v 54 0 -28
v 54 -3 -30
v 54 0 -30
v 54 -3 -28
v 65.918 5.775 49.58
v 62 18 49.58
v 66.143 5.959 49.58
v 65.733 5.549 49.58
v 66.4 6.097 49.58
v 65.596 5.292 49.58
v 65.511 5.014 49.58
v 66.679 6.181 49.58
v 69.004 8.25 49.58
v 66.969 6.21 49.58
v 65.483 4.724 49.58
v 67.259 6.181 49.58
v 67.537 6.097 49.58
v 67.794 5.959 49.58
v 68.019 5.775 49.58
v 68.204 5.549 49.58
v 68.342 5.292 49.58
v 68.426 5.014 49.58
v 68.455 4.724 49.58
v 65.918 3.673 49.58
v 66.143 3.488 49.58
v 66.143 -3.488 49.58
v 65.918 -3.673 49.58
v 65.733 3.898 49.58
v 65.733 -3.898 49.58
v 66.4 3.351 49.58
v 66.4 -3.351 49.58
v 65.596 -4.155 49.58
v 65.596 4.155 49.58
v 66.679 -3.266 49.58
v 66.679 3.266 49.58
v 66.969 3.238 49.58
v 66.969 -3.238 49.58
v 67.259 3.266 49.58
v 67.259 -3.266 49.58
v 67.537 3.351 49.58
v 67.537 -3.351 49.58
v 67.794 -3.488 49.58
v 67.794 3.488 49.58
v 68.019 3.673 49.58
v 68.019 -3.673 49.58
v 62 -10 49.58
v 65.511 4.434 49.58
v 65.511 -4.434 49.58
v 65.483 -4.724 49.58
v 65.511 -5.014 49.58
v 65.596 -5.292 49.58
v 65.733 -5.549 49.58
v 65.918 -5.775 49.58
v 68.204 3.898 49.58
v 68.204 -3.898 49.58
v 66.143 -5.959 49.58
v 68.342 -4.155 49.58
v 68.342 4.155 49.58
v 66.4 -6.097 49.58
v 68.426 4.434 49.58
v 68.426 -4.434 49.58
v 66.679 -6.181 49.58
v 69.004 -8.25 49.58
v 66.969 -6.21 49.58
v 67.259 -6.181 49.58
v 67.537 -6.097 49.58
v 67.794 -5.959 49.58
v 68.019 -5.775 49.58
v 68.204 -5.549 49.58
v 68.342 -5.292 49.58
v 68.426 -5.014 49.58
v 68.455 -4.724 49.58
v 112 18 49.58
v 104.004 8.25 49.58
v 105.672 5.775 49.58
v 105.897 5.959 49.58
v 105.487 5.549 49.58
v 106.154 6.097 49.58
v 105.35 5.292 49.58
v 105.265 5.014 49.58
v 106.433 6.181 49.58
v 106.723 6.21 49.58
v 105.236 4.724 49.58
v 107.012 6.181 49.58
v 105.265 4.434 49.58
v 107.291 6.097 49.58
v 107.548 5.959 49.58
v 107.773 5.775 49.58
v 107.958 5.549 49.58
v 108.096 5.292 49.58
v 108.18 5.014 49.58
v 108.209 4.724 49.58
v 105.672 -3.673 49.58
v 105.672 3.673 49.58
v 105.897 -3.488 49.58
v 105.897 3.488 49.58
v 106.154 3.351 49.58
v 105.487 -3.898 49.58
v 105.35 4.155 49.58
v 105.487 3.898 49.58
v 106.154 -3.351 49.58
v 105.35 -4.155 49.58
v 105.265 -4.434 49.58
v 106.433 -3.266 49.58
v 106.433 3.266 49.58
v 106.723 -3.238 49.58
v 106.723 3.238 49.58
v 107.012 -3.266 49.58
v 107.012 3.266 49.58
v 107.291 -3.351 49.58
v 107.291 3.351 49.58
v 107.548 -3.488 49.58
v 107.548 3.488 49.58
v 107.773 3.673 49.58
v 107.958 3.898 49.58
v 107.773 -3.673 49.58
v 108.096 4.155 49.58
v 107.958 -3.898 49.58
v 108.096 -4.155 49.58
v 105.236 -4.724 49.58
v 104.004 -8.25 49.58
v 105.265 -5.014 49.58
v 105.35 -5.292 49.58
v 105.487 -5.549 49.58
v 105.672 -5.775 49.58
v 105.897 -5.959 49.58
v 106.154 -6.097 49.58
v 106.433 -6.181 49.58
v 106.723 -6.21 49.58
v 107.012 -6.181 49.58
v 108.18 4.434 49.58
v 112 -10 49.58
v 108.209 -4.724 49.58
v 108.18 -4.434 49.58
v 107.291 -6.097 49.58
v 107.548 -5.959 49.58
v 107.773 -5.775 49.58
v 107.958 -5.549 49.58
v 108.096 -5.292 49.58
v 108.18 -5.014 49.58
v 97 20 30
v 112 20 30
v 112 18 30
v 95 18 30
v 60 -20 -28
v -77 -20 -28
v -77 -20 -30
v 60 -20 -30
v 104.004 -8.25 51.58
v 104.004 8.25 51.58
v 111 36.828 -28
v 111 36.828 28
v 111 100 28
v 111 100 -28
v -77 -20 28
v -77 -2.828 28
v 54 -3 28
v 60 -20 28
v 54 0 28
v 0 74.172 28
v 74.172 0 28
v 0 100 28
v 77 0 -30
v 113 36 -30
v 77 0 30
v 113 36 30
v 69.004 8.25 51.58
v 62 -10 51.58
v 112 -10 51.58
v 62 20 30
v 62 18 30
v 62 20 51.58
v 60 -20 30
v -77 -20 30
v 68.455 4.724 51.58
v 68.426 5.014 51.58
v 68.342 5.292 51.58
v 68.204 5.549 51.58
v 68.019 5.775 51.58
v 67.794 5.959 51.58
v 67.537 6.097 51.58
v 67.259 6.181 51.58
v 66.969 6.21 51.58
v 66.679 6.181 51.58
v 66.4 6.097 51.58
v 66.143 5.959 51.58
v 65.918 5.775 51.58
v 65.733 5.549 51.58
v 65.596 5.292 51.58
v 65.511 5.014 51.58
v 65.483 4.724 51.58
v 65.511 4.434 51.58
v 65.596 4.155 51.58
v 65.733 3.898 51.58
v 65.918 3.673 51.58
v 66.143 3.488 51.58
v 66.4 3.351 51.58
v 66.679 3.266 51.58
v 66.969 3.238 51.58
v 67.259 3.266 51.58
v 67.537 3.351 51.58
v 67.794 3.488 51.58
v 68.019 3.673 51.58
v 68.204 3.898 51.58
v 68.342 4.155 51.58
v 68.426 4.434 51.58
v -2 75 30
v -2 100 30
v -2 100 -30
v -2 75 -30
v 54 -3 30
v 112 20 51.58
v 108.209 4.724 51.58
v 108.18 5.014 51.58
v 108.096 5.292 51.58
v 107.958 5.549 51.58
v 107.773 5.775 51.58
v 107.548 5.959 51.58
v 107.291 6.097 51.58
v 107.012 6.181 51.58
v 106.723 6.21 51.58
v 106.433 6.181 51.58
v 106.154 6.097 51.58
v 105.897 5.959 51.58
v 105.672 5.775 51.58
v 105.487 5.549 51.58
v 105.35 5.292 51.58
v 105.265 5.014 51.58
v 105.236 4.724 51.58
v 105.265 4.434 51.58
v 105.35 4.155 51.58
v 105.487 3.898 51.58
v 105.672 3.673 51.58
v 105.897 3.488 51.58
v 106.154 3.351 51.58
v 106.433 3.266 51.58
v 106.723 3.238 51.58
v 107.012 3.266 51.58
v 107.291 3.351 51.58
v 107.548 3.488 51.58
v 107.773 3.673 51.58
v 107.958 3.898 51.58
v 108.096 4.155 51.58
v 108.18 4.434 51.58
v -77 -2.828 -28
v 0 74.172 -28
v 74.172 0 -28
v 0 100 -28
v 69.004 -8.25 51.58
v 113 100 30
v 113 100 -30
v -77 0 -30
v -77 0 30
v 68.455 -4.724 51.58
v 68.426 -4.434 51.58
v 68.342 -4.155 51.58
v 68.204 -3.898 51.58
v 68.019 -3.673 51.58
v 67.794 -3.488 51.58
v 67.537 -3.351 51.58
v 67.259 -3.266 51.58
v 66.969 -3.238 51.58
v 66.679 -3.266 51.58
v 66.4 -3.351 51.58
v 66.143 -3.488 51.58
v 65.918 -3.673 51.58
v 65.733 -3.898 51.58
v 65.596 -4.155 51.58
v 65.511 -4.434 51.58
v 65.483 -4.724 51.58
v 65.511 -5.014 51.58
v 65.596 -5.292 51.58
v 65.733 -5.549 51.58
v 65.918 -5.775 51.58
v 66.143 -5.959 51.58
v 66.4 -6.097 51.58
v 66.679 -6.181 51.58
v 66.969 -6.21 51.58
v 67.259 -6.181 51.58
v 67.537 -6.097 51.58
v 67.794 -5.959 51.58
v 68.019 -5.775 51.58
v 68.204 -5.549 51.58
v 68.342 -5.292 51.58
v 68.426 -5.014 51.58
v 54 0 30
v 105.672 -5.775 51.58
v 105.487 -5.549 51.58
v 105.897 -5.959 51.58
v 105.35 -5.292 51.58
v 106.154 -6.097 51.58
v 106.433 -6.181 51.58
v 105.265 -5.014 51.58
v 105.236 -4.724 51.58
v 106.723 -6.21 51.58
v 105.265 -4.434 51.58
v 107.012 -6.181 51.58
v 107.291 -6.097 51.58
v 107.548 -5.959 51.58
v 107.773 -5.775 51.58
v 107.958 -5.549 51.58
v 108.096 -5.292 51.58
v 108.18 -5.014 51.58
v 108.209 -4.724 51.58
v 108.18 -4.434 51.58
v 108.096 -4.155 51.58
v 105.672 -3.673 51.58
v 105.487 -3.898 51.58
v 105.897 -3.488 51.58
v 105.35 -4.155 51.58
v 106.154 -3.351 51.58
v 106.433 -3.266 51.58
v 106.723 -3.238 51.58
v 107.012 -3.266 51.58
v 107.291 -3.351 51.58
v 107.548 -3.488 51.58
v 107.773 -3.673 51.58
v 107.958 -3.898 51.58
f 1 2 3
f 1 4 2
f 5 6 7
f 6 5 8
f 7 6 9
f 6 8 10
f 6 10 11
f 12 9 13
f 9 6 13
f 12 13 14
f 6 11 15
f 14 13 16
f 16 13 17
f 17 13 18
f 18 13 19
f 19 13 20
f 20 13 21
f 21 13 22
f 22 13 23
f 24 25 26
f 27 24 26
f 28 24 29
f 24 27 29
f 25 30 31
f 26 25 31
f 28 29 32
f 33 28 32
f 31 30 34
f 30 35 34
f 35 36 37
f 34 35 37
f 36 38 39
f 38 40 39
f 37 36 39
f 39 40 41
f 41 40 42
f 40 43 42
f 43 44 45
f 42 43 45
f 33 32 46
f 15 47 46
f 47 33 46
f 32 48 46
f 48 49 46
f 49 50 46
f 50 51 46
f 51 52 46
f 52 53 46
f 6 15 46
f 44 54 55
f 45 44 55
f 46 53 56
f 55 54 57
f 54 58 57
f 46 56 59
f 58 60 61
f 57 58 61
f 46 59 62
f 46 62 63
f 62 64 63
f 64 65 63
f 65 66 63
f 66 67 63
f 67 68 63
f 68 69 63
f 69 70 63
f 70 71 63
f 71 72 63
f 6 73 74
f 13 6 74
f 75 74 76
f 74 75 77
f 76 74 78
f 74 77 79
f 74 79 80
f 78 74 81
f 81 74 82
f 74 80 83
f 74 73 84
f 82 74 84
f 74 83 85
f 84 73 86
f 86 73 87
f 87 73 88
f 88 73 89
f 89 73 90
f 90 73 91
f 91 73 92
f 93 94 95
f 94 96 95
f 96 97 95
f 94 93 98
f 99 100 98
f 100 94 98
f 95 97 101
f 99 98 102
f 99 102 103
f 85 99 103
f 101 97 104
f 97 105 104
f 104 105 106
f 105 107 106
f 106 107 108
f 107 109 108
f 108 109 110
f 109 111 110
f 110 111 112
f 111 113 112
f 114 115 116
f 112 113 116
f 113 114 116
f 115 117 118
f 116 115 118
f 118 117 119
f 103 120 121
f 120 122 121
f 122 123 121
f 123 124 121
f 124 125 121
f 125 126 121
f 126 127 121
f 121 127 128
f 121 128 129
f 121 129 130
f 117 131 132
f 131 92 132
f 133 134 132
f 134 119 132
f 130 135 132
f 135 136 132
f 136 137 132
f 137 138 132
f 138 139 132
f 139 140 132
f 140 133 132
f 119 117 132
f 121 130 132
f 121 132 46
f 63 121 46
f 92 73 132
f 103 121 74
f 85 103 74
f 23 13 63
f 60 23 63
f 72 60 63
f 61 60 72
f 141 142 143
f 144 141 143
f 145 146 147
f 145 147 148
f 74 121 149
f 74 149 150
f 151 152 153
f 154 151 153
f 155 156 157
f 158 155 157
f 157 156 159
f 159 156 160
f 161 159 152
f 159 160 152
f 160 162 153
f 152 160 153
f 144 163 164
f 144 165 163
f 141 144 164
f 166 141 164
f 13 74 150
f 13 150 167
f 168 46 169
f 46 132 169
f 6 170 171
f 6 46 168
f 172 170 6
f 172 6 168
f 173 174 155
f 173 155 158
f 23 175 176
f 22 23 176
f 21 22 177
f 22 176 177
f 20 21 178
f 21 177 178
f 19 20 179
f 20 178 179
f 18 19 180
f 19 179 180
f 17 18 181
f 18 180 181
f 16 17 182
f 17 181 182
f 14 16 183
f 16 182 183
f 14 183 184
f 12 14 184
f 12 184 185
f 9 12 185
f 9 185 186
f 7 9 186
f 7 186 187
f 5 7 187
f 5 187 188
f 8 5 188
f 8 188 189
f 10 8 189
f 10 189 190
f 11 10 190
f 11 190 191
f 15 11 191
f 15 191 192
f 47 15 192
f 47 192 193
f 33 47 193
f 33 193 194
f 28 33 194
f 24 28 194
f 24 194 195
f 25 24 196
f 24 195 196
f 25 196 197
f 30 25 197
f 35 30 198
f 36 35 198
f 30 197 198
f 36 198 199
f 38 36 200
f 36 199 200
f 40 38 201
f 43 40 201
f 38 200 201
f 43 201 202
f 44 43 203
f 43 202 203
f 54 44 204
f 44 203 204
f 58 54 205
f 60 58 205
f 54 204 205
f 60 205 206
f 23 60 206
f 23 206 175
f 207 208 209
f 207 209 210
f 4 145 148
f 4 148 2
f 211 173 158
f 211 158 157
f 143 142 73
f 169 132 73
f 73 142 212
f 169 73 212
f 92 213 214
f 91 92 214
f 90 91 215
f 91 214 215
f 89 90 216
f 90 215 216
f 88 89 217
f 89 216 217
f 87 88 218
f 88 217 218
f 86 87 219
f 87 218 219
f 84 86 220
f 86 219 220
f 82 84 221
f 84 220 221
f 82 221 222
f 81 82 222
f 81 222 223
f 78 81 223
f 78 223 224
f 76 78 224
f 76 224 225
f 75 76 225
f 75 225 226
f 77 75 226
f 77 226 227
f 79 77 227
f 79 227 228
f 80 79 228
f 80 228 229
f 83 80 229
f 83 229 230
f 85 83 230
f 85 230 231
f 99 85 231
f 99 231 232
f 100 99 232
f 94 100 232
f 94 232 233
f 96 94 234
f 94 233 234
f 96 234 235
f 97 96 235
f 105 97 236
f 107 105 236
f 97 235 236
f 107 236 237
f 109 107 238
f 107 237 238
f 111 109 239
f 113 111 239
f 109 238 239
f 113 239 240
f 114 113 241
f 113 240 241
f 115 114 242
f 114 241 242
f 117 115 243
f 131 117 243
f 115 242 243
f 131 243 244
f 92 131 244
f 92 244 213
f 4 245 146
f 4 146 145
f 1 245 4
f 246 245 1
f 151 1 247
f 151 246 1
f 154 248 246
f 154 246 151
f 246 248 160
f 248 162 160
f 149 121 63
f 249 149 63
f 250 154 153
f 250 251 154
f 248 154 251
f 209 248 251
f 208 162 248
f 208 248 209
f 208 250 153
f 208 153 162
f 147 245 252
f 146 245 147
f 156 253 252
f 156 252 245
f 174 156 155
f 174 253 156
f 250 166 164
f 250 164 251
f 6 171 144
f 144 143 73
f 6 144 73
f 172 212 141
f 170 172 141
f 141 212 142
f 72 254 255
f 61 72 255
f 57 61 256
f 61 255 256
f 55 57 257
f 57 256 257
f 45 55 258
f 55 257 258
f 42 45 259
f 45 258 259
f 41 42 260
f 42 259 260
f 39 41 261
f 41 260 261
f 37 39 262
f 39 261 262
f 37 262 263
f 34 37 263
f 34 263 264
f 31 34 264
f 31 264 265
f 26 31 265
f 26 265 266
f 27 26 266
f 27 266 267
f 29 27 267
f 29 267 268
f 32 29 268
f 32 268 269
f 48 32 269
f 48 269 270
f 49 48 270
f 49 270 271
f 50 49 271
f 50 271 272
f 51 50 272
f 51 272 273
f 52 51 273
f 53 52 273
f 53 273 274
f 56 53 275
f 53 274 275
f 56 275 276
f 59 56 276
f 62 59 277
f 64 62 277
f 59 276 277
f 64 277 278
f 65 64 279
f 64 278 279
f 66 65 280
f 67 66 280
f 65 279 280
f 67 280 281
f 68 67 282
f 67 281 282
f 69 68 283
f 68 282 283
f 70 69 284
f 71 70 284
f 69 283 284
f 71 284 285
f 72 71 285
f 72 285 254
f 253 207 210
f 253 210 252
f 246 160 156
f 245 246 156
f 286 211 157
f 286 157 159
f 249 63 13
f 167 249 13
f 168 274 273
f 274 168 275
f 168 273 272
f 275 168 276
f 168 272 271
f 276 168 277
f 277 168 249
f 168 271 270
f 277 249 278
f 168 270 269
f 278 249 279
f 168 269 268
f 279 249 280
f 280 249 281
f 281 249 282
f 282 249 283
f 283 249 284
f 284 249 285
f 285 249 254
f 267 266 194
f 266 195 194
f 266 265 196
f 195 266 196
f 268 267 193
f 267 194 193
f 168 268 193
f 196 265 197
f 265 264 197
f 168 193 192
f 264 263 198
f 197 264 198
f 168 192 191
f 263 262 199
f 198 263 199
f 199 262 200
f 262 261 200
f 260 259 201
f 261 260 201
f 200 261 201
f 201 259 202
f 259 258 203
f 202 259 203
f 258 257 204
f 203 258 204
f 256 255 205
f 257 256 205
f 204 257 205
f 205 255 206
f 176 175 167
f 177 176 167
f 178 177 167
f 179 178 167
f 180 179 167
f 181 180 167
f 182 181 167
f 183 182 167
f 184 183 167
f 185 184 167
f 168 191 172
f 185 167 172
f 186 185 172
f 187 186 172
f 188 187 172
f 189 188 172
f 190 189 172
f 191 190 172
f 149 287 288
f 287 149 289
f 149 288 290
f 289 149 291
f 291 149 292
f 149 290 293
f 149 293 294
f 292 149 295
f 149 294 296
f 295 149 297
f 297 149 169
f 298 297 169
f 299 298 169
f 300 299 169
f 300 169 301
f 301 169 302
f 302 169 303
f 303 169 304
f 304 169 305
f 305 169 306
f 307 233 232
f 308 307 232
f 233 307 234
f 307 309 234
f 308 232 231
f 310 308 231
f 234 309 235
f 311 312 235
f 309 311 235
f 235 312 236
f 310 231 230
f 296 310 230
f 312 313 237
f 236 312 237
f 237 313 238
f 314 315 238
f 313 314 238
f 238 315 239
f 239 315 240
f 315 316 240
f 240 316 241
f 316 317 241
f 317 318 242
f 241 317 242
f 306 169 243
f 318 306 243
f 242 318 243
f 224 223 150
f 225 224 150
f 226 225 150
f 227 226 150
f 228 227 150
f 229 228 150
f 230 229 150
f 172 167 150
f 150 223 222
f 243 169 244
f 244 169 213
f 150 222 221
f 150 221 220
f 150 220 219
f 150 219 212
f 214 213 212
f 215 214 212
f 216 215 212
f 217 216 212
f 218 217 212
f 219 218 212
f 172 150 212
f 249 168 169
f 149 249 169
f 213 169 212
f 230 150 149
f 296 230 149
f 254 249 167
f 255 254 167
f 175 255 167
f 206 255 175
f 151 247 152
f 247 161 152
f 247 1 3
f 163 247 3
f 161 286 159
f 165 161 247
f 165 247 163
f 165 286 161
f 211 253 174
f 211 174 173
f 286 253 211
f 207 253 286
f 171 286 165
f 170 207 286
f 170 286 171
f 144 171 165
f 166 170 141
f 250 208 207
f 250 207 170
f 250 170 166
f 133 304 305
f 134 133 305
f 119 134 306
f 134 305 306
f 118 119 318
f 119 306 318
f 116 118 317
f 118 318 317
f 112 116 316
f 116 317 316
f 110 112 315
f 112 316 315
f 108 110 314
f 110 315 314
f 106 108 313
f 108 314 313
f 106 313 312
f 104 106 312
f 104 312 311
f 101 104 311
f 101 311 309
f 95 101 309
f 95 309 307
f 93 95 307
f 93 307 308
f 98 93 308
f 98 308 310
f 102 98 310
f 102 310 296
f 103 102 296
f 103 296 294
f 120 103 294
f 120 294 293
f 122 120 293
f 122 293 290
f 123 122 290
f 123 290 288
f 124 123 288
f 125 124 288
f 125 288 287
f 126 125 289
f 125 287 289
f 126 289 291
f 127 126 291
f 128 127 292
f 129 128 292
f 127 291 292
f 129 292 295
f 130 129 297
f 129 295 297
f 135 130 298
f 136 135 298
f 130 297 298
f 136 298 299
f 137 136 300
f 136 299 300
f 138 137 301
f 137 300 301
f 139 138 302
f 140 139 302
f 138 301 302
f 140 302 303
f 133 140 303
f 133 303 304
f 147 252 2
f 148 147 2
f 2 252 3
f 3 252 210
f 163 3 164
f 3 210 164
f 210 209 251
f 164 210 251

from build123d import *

# Parameters (mm, degrees)
BOSS_EXTRUDE3_DEPTH = 30
SHELL1_T            = -2
BOSS_EXTRUDE2_DEPTH = 25
CUT_EXTRUDE1_REACH  = 172.593
SKETCH5_W           = 35
SKETCH5_H           = 16.5
CUT_EXTRUDE2_REACH  = 173.535
SKETCH6_R           = 1.486127865


with BuildPart() as part:
    # Sketch8 → Boss-Extrude3 (new, symmetric)
    with BuildSketch(Plane.XY):
        Polygon((77, 0), (113, 36), (113, 100), (-2, 100), (-2, 75), (-77, 0), (-77, -20), (60, -20), (54, -3), (54, 0), align=None)
    extrude(amount=BOSS_EXTRUDE3_DEPTH, both=True)

    # Shell1
    shell1_openings = [part.faces().sort_by_distance(p)[0] for p in [
        (54, -1.5, 0),
        (57, -11.5, 0),
        (-8.5, -20, 0),
        (-77, -10, 0),
        (55.5, 100, 0),
        (65.5, 0, 0),
    ]]
    offset(amount=SHELL1_T, openings=shell1_openings, kind=Kind.INTERSECTION)

    # Sketch4 → Boss-Extrude2 (add, symmetric)
    with BuildSketch(Plane(origin=(87, 0, 0), x_dir=(0, 0, -1), z_dir=(1, 0, 0))):
        Polygon((-30, 20), (-30, 18), (-49.58, 18), (-49.58, -10), (-51.58, -10), (-51.58, 20), align=None)
    extrude(amount=BOSS_EXTRUDE2_DEPTH, both=True)

    # Sketch5 → Cut-Extrude1 (cut, up to next)
    with BuildSketch(Plane(origin=(0, 0, 49.58), x_dir=(-1, 0, 0), z_dir=(0, 0, -1)), mode=Mode.PRIVATE) as cut_extrude1_sk1:
        with Locations((-86.503731014, 0)):
            Rectangle(SKETCH5_W, SKETCH5_H)
    cut_extrude1_tool1 = extrude(cut_extrude1_sk1.sketch, amount=-CUT_EXTRUDE1_REACH, mode=Mode.PRIVATE) & part.part
    add(cut_extrude1_tool1.solids().sort_by_distance((86.503731, 0, 49.58))[0], mode=Mode.SUBTRACT)

    # Sketch6 → Cut-Extrude2 (cut, up to next)
    with BuildSketch(Plane.XY.offset(51.58), mode=Mode.PRIVATE) as cut_extrude2_sk1:
        with Locations((66.968636912, 4.723763571)):
            Circle(SKETCH6_R)
    cut_extrude2_tool1 = extrude(cut_extrude2_sk1.sketch, amount=-CUT_EXTRUDE2_REACH, mode=Mode.PRIVATE) & part.part
    # Sketch6 → Cut-Extrude2 (cut, up to next)
    with BuildSketch(Plane.XY.offset(51.58), mode=Mode.PRIVATE) as cut_extrude2_sk2:
        with Locations((106.722557298, 4.723763571)):
            Circle(SKETCH6_R)
    cut_extrude2_tool2 = extrude(cut_extrude2_sk2.sketch, amount=-CUT_EXTRUDE2_REACH, mode=Mode.PRIVATE) & part.part
    # Sketch6 → Cut-Extrude2 (cut, up to next)
    with BuildSketch(Plane.XY.offset(51.58), mode=Mode.PRIVATE) as cut_extrude2_sk3:
        with Locations((106.722557298, -4.723763571)):
            Circle(SKETCH6_R)
    cut_extrude2_tool3 = extrude(cut_extrude2_sk3.sketch, amount=-CUT_EXTRUDE2_REACH, mode=Mode.PRIVATE) & part.part
    # Sketch6 → Cut-Extrude2 (cut, up to next)
    with BuildSketch(Plane.XY.offset(51.58), mode=Mode.PRIVATE) as cut_extrude2_sk4:
        with Locations((66.968636912, -4.723763571)):
            Circle(SKETCH6_R)
    cut_extrude2_tool4 = extrude(cut_extrude2_sk4.sketch, amount=-CUT_EXTRUDE2_REACH, mode=Mode.PRIVATE) & part.part
    add(cut_extrude2_tool1.solids().sort_by_distance((66.968637, 4.723764, 51.58))[0], mode=Mode.SUBTRACT)
    add(cut_extrude2_tool2.solids().sort_by_distance((106.722557, 4.723764, 51.58))[0], mode=Mode.SUBTRACT)
    add(cut_extrude2_tool3.solids().sort_by_distance((106.722557, -4.723764, 51.58))[0], mode=Mode.SUBTRACT)
    add(cut_extrude2_tool4.solids().sort_by_distance((66.968637, -4.723764, 51.58))[0], mode=Mode.SUBTRACT)


solid = part.part
